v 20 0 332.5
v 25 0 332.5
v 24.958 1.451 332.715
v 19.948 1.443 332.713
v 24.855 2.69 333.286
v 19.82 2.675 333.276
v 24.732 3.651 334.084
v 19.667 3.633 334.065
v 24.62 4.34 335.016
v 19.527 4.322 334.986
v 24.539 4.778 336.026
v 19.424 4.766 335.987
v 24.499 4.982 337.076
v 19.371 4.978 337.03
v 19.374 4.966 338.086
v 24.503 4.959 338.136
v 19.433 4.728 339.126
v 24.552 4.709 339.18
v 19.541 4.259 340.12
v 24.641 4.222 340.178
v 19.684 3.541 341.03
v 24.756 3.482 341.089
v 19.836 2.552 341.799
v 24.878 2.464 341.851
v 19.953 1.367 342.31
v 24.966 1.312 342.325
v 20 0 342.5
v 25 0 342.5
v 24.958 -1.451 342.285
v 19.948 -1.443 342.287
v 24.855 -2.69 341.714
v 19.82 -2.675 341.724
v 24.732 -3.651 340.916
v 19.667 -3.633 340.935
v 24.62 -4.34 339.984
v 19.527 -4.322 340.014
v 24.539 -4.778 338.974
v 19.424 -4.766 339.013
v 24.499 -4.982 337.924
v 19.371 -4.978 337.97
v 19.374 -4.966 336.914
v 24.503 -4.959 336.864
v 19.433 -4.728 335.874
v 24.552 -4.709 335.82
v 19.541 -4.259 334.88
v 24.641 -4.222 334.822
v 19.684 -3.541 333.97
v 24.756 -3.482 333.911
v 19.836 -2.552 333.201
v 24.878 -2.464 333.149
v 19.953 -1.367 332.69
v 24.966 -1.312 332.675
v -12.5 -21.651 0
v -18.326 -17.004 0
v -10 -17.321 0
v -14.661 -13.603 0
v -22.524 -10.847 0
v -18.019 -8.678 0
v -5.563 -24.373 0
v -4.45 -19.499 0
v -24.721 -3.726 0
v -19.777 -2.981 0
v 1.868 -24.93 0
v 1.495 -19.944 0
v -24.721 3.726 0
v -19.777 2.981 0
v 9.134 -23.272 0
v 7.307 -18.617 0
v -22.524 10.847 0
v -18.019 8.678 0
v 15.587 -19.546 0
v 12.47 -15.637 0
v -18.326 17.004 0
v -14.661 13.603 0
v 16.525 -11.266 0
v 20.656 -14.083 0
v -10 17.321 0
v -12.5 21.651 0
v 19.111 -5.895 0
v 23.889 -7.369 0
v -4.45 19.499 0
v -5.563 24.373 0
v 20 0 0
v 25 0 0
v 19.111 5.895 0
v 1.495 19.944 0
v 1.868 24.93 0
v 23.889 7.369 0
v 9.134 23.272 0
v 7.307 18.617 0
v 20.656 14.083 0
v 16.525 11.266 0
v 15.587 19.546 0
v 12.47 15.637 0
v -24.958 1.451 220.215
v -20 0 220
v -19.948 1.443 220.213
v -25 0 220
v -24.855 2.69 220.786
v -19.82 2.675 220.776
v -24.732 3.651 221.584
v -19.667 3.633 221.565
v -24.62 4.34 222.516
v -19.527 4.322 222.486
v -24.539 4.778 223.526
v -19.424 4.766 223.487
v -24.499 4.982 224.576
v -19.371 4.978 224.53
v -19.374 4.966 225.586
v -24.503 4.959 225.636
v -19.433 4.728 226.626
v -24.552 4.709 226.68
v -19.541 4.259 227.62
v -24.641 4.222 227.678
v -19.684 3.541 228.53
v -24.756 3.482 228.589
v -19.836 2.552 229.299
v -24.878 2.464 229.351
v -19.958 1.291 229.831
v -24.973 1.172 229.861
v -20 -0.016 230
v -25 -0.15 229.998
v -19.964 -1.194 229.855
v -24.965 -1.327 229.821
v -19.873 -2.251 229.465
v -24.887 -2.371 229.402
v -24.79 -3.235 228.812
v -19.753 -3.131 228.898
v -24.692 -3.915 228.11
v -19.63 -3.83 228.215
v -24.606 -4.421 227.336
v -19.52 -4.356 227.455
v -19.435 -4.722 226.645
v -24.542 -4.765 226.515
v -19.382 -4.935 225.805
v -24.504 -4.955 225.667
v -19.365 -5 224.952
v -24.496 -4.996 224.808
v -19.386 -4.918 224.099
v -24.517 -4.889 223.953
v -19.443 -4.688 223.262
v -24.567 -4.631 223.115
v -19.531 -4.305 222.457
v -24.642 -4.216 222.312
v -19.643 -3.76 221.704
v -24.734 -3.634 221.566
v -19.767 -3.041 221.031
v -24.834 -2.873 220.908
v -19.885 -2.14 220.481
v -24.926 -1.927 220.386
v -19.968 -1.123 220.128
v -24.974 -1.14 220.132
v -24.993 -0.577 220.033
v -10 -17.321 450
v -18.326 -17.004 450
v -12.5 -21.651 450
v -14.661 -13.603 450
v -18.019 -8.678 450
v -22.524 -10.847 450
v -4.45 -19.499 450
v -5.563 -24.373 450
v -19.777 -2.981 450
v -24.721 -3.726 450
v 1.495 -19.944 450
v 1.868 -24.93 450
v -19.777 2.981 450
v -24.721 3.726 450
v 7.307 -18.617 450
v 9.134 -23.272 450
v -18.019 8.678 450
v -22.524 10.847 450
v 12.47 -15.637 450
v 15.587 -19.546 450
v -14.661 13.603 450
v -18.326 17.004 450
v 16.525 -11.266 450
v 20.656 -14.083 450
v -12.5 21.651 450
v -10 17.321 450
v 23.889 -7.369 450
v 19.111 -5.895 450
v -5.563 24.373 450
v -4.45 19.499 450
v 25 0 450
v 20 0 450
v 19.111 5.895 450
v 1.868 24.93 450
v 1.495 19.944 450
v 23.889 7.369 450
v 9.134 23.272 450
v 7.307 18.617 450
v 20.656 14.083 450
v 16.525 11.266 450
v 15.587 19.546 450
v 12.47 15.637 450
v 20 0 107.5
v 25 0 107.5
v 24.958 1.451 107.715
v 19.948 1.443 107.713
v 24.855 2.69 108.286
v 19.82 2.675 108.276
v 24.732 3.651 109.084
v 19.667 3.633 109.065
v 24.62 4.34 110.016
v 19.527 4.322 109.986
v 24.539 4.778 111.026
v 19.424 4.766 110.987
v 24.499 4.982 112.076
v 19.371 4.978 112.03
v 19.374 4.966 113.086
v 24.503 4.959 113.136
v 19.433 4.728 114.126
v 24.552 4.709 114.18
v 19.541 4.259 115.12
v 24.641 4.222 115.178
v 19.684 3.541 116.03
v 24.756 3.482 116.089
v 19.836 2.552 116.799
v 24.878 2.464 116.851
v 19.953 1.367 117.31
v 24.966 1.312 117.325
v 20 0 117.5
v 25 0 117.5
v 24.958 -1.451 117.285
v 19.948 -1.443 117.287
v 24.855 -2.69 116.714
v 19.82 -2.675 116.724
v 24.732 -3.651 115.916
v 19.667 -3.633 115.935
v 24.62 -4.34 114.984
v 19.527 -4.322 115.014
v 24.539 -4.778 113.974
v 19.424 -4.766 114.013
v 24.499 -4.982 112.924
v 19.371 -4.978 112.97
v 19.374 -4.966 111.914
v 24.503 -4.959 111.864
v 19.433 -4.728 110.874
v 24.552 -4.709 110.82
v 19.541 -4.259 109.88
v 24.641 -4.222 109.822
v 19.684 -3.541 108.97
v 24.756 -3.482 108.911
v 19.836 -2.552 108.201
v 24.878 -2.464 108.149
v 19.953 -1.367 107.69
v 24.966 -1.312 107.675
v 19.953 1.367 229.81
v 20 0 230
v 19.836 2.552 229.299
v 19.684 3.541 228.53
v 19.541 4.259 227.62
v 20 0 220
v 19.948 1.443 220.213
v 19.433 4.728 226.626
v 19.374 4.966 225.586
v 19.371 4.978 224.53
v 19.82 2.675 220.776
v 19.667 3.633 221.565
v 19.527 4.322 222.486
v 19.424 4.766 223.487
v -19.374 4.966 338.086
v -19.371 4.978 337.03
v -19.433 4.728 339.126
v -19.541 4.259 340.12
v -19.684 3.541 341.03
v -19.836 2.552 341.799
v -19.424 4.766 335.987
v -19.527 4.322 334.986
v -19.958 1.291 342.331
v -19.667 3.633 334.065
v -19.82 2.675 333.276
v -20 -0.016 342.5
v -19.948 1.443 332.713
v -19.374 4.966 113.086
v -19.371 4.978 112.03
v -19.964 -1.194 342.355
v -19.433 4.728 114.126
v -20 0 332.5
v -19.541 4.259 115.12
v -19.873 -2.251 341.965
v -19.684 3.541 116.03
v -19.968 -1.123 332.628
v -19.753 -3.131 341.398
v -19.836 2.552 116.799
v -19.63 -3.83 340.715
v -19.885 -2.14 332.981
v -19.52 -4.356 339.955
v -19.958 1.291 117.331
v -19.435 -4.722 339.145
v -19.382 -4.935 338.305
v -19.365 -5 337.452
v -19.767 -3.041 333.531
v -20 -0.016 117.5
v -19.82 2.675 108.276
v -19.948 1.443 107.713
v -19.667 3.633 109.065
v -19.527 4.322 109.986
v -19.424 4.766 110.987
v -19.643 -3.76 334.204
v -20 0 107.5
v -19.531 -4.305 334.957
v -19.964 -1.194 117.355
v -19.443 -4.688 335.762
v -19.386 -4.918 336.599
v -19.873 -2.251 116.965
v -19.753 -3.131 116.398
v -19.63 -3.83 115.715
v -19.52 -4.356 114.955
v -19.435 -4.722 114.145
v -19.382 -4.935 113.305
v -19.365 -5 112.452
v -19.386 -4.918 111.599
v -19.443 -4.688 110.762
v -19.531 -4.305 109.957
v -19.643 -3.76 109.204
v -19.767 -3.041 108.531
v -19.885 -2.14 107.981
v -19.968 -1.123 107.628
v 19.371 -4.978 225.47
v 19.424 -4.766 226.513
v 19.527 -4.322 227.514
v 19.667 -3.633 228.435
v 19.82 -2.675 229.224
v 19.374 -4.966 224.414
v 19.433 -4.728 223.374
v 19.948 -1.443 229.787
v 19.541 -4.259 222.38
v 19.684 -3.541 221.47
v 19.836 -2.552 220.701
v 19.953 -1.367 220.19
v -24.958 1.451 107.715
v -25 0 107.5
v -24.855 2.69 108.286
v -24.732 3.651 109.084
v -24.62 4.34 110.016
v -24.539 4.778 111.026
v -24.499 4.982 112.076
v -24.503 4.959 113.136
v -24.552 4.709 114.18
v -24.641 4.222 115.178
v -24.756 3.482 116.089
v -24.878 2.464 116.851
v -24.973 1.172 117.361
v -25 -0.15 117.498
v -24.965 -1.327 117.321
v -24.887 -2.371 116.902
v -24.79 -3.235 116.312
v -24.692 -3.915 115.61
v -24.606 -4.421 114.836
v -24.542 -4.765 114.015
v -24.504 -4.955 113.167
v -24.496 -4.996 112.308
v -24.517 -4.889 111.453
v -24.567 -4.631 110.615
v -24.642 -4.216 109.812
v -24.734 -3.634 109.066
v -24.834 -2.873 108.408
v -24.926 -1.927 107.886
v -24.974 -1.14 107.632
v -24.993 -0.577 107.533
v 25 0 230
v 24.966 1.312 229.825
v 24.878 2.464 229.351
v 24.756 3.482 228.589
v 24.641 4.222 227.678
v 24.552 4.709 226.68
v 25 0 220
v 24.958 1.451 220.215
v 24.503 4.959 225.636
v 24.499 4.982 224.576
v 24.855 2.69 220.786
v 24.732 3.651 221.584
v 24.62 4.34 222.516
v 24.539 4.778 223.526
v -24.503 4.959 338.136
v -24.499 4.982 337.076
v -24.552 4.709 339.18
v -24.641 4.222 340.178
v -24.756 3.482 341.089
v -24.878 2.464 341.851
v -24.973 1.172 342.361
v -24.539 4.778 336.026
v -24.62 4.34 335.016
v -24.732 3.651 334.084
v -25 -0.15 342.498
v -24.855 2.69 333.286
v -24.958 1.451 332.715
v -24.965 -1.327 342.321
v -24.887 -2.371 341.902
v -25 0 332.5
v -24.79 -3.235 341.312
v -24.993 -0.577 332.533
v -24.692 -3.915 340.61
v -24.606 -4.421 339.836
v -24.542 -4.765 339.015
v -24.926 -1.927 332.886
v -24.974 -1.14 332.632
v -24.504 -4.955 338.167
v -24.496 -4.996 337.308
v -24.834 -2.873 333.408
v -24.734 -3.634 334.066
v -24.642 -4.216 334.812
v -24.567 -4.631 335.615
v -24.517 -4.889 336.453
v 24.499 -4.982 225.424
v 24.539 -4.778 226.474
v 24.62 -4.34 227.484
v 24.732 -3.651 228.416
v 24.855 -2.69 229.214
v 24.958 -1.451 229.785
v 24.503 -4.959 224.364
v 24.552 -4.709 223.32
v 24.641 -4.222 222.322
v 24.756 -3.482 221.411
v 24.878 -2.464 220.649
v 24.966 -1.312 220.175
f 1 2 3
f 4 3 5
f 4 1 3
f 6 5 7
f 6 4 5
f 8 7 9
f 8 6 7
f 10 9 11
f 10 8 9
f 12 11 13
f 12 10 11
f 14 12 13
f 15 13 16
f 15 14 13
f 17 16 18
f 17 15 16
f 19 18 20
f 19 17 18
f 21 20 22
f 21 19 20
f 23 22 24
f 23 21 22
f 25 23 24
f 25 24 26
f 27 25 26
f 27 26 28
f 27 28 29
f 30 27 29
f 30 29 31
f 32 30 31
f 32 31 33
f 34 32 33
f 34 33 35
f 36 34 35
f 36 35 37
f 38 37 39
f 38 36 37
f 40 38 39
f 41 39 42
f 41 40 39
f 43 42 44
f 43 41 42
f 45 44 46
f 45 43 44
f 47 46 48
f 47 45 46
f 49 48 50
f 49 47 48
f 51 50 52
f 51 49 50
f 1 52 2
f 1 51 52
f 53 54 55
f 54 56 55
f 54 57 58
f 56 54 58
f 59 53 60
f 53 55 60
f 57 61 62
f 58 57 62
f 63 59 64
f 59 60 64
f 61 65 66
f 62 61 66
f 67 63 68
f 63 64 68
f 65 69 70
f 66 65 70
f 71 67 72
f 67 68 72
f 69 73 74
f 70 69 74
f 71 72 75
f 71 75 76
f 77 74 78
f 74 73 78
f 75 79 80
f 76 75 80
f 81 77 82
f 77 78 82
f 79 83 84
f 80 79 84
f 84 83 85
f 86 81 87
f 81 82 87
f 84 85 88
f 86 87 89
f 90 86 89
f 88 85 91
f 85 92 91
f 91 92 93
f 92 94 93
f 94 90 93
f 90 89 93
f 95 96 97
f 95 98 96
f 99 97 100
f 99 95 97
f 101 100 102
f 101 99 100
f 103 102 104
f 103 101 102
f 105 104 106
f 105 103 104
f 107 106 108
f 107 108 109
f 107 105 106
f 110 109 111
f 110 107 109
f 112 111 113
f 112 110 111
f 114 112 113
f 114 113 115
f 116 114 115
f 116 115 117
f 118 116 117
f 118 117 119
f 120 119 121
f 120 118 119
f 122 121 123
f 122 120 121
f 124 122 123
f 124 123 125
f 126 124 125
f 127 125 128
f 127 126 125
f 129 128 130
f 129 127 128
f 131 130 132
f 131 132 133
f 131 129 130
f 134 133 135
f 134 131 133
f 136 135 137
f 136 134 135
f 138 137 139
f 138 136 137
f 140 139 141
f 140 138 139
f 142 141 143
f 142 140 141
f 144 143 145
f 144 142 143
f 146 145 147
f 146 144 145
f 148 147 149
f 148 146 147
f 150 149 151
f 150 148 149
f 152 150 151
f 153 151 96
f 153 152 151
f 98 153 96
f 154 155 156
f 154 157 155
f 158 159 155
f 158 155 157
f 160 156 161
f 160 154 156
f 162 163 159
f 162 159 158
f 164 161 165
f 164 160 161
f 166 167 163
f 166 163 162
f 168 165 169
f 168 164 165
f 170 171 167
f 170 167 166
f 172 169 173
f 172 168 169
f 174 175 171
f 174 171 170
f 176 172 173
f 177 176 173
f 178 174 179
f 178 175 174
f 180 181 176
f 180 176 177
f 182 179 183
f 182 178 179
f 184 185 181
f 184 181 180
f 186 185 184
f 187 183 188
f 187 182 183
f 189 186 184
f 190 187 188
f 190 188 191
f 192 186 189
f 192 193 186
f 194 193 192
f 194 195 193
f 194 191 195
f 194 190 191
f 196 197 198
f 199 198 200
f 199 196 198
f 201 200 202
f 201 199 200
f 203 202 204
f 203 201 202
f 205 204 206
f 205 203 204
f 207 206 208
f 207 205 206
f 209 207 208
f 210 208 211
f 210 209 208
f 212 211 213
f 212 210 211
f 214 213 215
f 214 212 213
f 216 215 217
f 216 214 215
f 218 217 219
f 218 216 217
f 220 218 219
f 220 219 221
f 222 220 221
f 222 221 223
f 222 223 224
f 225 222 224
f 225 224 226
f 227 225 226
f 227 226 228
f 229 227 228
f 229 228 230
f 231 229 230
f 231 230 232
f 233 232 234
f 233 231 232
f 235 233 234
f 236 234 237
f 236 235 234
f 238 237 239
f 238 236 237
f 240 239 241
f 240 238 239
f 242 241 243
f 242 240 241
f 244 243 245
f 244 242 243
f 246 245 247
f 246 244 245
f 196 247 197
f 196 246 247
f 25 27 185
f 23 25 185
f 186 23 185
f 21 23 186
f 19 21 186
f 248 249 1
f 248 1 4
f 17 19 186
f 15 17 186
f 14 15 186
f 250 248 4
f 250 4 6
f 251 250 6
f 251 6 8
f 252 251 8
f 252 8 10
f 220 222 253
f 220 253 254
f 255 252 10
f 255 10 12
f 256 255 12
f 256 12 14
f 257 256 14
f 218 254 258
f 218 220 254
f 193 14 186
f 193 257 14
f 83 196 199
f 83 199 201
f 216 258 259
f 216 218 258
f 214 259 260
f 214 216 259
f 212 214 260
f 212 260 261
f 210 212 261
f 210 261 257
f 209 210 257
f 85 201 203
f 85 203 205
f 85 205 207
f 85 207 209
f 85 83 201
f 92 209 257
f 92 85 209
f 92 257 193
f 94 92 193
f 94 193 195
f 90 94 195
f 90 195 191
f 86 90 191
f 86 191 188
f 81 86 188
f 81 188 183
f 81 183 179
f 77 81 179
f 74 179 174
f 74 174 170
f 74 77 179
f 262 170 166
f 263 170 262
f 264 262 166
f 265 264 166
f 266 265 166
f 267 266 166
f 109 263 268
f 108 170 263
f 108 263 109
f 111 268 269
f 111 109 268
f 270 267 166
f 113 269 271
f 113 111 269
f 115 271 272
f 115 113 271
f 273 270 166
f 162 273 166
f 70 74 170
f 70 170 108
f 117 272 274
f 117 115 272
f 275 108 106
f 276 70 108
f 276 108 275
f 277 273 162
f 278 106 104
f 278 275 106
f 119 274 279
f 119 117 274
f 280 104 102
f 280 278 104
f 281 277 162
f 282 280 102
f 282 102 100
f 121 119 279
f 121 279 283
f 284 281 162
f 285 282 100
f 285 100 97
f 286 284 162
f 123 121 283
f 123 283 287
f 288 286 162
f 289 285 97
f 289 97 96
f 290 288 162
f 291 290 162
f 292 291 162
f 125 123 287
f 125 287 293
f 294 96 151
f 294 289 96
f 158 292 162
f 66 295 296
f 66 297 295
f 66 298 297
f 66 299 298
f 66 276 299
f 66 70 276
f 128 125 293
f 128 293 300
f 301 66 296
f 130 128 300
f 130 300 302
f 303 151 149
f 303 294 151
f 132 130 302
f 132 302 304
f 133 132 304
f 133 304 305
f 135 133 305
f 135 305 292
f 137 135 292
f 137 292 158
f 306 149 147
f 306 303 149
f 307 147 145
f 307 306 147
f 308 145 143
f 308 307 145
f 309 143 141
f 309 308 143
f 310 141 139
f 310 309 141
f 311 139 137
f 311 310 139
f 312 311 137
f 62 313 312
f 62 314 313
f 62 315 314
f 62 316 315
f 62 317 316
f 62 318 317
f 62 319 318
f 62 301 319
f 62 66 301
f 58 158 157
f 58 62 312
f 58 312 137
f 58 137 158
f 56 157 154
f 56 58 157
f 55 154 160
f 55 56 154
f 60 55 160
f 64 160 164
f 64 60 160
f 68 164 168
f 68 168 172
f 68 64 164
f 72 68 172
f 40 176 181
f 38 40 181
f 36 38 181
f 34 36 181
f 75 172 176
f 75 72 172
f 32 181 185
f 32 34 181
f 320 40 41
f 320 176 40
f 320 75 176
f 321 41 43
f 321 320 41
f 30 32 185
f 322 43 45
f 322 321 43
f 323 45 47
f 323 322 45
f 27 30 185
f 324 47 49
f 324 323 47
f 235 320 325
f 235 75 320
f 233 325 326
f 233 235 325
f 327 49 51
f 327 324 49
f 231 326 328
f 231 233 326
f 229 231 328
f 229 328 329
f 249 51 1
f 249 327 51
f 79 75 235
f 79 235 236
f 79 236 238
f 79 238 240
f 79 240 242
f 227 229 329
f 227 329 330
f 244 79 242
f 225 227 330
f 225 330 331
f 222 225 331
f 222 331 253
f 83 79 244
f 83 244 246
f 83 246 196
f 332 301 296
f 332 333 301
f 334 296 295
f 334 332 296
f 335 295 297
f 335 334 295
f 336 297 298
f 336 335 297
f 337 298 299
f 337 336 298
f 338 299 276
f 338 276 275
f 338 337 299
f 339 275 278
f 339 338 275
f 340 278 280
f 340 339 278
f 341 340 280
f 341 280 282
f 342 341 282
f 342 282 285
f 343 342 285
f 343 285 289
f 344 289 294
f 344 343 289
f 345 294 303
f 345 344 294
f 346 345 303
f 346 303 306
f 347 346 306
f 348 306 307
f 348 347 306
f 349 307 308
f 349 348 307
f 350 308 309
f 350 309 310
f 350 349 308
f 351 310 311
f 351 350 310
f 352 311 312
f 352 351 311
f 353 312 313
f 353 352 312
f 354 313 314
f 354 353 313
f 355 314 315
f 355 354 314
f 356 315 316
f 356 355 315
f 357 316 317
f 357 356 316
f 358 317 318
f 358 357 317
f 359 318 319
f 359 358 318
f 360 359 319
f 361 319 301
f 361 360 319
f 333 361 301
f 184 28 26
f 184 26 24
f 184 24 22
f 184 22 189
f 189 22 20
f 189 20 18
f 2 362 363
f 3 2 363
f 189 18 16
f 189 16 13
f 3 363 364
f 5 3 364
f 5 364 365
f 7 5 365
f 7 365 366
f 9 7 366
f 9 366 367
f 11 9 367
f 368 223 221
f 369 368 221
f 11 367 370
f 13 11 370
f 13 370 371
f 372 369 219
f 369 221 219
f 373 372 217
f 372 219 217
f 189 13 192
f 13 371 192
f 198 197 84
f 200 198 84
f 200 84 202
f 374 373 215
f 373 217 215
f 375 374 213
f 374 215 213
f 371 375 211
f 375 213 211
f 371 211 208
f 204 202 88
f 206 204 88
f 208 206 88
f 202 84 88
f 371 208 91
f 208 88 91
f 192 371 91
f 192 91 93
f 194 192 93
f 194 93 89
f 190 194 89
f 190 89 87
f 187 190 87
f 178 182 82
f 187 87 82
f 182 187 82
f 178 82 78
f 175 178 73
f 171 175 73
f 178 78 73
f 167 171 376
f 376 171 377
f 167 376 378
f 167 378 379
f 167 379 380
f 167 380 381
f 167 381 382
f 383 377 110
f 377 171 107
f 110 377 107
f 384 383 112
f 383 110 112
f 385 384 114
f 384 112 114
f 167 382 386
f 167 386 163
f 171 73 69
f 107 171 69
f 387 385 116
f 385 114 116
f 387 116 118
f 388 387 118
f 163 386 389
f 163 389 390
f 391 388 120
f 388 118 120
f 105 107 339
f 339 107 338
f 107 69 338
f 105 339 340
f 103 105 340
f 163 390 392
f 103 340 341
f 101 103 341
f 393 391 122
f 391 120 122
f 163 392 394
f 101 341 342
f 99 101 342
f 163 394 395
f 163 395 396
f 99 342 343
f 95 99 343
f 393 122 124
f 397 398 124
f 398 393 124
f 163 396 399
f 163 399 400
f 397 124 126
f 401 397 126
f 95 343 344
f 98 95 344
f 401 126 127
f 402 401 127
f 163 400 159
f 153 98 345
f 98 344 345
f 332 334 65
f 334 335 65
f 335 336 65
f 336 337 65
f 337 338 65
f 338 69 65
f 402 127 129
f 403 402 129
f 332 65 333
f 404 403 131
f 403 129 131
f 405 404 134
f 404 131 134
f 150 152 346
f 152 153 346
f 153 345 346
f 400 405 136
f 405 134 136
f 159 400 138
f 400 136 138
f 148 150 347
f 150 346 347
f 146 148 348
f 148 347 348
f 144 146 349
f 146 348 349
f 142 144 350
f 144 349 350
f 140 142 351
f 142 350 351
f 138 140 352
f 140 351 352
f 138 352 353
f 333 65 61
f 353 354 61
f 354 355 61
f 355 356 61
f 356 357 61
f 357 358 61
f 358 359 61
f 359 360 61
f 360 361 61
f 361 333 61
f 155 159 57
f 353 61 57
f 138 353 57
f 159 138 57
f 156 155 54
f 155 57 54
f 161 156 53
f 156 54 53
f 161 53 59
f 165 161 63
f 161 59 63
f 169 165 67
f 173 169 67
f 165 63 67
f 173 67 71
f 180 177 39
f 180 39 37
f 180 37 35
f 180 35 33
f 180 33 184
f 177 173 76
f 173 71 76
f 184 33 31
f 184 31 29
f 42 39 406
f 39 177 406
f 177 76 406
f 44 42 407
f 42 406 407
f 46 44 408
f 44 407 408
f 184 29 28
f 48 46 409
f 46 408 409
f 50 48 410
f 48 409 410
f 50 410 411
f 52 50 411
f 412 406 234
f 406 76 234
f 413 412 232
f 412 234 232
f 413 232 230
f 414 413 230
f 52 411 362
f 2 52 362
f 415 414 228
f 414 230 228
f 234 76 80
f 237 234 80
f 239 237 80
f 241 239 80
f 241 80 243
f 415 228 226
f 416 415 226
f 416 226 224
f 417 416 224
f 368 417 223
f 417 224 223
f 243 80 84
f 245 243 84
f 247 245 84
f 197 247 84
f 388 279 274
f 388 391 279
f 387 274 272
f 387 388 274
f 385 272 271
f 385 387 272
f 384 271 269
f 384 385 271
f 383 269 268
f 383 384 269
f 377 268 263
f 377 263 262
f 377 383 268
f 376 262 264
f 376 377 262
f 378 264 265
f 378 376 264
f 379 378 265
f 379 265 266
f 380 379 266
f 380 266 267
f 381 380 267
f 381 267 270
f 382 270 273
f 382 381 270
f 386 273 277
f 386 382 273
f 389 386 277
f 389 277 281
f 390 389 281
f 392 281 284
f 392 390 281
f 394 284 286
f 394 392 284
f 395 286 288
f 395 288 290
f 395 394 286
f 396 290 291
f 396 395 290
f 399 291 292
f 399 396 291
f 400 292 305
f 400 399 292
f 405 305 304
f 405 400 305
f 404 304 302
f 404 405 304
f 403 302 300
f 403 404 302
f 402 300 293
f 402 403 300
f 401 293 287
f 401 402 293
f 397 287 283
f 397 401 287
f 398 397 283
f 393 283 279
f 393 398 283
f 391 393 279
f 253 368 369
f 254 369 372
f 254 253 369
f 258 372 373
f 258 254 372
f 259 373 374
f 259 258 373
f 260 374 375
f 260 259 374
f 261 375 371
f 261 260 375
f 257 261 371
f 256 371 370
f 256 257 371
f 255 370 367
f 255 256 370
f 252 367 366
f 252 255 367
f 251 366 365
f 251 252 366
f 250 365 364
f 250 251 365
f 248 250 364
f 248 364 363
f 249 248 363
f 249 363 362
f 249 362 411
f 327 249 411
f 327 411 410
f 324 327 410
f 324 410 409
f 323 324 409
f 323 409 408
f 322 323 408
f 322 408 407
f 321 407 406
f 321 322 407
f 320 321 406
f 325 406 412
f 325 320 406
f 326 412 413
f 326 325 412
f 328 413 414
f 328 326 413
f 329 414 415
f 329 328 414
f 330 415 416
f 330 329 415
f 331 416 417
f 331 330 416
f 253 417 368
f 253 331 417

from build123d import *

# Parameters (mm, degrees)
SKETCH1_R               = 25
SKETCH1_R_2             = 20
BOSS_EXTRUDE1_DEPTH     = 450
CUT_EXTRUDE2_DEPTH      = 452.386752132
CUT_EXTRUDE2_DEPTH_BACK = 452.386752132
SKETCH2_R               = 5


with BuildPart() as part:
    # Sketch1 → Boss-Extrude1 (new body)
    with BuildSketch(Plane.XY):
        Circle(SKETCH1_R)
        Circle(SKETCH1_R_2, mode=Mode.SUBTRACT)
    extrude(amount=BOSS_EXTRUDE1_DEPTH)

    # Sketch2 → Cut-Extrude2 (cut, two sides: drawn at the far end of the back side and taken through both)
    with BuildSketch(Plane(origin=(0, 0, 0), x_dir=(0, 0, -1), z_dir=(1, 0, 0)).offset(-CUT_EXTRUDE2_DEPTH_BACK)):
        with Locations((-337.5, 0)):
            Circle(SKETCH2_R)
        with Locations((-225, 0)):
            Circle(SKETCH2_R)
        with Locations((-112.5, 0)):
            Circle(SKETCH2_R)
    extrude(amount=CUT_EXTRUDE2_DEPTH + CUT_EXTRUDE2_DEPTH_BACK, mode=Mode.SUBTRACT)


solid = part.part
